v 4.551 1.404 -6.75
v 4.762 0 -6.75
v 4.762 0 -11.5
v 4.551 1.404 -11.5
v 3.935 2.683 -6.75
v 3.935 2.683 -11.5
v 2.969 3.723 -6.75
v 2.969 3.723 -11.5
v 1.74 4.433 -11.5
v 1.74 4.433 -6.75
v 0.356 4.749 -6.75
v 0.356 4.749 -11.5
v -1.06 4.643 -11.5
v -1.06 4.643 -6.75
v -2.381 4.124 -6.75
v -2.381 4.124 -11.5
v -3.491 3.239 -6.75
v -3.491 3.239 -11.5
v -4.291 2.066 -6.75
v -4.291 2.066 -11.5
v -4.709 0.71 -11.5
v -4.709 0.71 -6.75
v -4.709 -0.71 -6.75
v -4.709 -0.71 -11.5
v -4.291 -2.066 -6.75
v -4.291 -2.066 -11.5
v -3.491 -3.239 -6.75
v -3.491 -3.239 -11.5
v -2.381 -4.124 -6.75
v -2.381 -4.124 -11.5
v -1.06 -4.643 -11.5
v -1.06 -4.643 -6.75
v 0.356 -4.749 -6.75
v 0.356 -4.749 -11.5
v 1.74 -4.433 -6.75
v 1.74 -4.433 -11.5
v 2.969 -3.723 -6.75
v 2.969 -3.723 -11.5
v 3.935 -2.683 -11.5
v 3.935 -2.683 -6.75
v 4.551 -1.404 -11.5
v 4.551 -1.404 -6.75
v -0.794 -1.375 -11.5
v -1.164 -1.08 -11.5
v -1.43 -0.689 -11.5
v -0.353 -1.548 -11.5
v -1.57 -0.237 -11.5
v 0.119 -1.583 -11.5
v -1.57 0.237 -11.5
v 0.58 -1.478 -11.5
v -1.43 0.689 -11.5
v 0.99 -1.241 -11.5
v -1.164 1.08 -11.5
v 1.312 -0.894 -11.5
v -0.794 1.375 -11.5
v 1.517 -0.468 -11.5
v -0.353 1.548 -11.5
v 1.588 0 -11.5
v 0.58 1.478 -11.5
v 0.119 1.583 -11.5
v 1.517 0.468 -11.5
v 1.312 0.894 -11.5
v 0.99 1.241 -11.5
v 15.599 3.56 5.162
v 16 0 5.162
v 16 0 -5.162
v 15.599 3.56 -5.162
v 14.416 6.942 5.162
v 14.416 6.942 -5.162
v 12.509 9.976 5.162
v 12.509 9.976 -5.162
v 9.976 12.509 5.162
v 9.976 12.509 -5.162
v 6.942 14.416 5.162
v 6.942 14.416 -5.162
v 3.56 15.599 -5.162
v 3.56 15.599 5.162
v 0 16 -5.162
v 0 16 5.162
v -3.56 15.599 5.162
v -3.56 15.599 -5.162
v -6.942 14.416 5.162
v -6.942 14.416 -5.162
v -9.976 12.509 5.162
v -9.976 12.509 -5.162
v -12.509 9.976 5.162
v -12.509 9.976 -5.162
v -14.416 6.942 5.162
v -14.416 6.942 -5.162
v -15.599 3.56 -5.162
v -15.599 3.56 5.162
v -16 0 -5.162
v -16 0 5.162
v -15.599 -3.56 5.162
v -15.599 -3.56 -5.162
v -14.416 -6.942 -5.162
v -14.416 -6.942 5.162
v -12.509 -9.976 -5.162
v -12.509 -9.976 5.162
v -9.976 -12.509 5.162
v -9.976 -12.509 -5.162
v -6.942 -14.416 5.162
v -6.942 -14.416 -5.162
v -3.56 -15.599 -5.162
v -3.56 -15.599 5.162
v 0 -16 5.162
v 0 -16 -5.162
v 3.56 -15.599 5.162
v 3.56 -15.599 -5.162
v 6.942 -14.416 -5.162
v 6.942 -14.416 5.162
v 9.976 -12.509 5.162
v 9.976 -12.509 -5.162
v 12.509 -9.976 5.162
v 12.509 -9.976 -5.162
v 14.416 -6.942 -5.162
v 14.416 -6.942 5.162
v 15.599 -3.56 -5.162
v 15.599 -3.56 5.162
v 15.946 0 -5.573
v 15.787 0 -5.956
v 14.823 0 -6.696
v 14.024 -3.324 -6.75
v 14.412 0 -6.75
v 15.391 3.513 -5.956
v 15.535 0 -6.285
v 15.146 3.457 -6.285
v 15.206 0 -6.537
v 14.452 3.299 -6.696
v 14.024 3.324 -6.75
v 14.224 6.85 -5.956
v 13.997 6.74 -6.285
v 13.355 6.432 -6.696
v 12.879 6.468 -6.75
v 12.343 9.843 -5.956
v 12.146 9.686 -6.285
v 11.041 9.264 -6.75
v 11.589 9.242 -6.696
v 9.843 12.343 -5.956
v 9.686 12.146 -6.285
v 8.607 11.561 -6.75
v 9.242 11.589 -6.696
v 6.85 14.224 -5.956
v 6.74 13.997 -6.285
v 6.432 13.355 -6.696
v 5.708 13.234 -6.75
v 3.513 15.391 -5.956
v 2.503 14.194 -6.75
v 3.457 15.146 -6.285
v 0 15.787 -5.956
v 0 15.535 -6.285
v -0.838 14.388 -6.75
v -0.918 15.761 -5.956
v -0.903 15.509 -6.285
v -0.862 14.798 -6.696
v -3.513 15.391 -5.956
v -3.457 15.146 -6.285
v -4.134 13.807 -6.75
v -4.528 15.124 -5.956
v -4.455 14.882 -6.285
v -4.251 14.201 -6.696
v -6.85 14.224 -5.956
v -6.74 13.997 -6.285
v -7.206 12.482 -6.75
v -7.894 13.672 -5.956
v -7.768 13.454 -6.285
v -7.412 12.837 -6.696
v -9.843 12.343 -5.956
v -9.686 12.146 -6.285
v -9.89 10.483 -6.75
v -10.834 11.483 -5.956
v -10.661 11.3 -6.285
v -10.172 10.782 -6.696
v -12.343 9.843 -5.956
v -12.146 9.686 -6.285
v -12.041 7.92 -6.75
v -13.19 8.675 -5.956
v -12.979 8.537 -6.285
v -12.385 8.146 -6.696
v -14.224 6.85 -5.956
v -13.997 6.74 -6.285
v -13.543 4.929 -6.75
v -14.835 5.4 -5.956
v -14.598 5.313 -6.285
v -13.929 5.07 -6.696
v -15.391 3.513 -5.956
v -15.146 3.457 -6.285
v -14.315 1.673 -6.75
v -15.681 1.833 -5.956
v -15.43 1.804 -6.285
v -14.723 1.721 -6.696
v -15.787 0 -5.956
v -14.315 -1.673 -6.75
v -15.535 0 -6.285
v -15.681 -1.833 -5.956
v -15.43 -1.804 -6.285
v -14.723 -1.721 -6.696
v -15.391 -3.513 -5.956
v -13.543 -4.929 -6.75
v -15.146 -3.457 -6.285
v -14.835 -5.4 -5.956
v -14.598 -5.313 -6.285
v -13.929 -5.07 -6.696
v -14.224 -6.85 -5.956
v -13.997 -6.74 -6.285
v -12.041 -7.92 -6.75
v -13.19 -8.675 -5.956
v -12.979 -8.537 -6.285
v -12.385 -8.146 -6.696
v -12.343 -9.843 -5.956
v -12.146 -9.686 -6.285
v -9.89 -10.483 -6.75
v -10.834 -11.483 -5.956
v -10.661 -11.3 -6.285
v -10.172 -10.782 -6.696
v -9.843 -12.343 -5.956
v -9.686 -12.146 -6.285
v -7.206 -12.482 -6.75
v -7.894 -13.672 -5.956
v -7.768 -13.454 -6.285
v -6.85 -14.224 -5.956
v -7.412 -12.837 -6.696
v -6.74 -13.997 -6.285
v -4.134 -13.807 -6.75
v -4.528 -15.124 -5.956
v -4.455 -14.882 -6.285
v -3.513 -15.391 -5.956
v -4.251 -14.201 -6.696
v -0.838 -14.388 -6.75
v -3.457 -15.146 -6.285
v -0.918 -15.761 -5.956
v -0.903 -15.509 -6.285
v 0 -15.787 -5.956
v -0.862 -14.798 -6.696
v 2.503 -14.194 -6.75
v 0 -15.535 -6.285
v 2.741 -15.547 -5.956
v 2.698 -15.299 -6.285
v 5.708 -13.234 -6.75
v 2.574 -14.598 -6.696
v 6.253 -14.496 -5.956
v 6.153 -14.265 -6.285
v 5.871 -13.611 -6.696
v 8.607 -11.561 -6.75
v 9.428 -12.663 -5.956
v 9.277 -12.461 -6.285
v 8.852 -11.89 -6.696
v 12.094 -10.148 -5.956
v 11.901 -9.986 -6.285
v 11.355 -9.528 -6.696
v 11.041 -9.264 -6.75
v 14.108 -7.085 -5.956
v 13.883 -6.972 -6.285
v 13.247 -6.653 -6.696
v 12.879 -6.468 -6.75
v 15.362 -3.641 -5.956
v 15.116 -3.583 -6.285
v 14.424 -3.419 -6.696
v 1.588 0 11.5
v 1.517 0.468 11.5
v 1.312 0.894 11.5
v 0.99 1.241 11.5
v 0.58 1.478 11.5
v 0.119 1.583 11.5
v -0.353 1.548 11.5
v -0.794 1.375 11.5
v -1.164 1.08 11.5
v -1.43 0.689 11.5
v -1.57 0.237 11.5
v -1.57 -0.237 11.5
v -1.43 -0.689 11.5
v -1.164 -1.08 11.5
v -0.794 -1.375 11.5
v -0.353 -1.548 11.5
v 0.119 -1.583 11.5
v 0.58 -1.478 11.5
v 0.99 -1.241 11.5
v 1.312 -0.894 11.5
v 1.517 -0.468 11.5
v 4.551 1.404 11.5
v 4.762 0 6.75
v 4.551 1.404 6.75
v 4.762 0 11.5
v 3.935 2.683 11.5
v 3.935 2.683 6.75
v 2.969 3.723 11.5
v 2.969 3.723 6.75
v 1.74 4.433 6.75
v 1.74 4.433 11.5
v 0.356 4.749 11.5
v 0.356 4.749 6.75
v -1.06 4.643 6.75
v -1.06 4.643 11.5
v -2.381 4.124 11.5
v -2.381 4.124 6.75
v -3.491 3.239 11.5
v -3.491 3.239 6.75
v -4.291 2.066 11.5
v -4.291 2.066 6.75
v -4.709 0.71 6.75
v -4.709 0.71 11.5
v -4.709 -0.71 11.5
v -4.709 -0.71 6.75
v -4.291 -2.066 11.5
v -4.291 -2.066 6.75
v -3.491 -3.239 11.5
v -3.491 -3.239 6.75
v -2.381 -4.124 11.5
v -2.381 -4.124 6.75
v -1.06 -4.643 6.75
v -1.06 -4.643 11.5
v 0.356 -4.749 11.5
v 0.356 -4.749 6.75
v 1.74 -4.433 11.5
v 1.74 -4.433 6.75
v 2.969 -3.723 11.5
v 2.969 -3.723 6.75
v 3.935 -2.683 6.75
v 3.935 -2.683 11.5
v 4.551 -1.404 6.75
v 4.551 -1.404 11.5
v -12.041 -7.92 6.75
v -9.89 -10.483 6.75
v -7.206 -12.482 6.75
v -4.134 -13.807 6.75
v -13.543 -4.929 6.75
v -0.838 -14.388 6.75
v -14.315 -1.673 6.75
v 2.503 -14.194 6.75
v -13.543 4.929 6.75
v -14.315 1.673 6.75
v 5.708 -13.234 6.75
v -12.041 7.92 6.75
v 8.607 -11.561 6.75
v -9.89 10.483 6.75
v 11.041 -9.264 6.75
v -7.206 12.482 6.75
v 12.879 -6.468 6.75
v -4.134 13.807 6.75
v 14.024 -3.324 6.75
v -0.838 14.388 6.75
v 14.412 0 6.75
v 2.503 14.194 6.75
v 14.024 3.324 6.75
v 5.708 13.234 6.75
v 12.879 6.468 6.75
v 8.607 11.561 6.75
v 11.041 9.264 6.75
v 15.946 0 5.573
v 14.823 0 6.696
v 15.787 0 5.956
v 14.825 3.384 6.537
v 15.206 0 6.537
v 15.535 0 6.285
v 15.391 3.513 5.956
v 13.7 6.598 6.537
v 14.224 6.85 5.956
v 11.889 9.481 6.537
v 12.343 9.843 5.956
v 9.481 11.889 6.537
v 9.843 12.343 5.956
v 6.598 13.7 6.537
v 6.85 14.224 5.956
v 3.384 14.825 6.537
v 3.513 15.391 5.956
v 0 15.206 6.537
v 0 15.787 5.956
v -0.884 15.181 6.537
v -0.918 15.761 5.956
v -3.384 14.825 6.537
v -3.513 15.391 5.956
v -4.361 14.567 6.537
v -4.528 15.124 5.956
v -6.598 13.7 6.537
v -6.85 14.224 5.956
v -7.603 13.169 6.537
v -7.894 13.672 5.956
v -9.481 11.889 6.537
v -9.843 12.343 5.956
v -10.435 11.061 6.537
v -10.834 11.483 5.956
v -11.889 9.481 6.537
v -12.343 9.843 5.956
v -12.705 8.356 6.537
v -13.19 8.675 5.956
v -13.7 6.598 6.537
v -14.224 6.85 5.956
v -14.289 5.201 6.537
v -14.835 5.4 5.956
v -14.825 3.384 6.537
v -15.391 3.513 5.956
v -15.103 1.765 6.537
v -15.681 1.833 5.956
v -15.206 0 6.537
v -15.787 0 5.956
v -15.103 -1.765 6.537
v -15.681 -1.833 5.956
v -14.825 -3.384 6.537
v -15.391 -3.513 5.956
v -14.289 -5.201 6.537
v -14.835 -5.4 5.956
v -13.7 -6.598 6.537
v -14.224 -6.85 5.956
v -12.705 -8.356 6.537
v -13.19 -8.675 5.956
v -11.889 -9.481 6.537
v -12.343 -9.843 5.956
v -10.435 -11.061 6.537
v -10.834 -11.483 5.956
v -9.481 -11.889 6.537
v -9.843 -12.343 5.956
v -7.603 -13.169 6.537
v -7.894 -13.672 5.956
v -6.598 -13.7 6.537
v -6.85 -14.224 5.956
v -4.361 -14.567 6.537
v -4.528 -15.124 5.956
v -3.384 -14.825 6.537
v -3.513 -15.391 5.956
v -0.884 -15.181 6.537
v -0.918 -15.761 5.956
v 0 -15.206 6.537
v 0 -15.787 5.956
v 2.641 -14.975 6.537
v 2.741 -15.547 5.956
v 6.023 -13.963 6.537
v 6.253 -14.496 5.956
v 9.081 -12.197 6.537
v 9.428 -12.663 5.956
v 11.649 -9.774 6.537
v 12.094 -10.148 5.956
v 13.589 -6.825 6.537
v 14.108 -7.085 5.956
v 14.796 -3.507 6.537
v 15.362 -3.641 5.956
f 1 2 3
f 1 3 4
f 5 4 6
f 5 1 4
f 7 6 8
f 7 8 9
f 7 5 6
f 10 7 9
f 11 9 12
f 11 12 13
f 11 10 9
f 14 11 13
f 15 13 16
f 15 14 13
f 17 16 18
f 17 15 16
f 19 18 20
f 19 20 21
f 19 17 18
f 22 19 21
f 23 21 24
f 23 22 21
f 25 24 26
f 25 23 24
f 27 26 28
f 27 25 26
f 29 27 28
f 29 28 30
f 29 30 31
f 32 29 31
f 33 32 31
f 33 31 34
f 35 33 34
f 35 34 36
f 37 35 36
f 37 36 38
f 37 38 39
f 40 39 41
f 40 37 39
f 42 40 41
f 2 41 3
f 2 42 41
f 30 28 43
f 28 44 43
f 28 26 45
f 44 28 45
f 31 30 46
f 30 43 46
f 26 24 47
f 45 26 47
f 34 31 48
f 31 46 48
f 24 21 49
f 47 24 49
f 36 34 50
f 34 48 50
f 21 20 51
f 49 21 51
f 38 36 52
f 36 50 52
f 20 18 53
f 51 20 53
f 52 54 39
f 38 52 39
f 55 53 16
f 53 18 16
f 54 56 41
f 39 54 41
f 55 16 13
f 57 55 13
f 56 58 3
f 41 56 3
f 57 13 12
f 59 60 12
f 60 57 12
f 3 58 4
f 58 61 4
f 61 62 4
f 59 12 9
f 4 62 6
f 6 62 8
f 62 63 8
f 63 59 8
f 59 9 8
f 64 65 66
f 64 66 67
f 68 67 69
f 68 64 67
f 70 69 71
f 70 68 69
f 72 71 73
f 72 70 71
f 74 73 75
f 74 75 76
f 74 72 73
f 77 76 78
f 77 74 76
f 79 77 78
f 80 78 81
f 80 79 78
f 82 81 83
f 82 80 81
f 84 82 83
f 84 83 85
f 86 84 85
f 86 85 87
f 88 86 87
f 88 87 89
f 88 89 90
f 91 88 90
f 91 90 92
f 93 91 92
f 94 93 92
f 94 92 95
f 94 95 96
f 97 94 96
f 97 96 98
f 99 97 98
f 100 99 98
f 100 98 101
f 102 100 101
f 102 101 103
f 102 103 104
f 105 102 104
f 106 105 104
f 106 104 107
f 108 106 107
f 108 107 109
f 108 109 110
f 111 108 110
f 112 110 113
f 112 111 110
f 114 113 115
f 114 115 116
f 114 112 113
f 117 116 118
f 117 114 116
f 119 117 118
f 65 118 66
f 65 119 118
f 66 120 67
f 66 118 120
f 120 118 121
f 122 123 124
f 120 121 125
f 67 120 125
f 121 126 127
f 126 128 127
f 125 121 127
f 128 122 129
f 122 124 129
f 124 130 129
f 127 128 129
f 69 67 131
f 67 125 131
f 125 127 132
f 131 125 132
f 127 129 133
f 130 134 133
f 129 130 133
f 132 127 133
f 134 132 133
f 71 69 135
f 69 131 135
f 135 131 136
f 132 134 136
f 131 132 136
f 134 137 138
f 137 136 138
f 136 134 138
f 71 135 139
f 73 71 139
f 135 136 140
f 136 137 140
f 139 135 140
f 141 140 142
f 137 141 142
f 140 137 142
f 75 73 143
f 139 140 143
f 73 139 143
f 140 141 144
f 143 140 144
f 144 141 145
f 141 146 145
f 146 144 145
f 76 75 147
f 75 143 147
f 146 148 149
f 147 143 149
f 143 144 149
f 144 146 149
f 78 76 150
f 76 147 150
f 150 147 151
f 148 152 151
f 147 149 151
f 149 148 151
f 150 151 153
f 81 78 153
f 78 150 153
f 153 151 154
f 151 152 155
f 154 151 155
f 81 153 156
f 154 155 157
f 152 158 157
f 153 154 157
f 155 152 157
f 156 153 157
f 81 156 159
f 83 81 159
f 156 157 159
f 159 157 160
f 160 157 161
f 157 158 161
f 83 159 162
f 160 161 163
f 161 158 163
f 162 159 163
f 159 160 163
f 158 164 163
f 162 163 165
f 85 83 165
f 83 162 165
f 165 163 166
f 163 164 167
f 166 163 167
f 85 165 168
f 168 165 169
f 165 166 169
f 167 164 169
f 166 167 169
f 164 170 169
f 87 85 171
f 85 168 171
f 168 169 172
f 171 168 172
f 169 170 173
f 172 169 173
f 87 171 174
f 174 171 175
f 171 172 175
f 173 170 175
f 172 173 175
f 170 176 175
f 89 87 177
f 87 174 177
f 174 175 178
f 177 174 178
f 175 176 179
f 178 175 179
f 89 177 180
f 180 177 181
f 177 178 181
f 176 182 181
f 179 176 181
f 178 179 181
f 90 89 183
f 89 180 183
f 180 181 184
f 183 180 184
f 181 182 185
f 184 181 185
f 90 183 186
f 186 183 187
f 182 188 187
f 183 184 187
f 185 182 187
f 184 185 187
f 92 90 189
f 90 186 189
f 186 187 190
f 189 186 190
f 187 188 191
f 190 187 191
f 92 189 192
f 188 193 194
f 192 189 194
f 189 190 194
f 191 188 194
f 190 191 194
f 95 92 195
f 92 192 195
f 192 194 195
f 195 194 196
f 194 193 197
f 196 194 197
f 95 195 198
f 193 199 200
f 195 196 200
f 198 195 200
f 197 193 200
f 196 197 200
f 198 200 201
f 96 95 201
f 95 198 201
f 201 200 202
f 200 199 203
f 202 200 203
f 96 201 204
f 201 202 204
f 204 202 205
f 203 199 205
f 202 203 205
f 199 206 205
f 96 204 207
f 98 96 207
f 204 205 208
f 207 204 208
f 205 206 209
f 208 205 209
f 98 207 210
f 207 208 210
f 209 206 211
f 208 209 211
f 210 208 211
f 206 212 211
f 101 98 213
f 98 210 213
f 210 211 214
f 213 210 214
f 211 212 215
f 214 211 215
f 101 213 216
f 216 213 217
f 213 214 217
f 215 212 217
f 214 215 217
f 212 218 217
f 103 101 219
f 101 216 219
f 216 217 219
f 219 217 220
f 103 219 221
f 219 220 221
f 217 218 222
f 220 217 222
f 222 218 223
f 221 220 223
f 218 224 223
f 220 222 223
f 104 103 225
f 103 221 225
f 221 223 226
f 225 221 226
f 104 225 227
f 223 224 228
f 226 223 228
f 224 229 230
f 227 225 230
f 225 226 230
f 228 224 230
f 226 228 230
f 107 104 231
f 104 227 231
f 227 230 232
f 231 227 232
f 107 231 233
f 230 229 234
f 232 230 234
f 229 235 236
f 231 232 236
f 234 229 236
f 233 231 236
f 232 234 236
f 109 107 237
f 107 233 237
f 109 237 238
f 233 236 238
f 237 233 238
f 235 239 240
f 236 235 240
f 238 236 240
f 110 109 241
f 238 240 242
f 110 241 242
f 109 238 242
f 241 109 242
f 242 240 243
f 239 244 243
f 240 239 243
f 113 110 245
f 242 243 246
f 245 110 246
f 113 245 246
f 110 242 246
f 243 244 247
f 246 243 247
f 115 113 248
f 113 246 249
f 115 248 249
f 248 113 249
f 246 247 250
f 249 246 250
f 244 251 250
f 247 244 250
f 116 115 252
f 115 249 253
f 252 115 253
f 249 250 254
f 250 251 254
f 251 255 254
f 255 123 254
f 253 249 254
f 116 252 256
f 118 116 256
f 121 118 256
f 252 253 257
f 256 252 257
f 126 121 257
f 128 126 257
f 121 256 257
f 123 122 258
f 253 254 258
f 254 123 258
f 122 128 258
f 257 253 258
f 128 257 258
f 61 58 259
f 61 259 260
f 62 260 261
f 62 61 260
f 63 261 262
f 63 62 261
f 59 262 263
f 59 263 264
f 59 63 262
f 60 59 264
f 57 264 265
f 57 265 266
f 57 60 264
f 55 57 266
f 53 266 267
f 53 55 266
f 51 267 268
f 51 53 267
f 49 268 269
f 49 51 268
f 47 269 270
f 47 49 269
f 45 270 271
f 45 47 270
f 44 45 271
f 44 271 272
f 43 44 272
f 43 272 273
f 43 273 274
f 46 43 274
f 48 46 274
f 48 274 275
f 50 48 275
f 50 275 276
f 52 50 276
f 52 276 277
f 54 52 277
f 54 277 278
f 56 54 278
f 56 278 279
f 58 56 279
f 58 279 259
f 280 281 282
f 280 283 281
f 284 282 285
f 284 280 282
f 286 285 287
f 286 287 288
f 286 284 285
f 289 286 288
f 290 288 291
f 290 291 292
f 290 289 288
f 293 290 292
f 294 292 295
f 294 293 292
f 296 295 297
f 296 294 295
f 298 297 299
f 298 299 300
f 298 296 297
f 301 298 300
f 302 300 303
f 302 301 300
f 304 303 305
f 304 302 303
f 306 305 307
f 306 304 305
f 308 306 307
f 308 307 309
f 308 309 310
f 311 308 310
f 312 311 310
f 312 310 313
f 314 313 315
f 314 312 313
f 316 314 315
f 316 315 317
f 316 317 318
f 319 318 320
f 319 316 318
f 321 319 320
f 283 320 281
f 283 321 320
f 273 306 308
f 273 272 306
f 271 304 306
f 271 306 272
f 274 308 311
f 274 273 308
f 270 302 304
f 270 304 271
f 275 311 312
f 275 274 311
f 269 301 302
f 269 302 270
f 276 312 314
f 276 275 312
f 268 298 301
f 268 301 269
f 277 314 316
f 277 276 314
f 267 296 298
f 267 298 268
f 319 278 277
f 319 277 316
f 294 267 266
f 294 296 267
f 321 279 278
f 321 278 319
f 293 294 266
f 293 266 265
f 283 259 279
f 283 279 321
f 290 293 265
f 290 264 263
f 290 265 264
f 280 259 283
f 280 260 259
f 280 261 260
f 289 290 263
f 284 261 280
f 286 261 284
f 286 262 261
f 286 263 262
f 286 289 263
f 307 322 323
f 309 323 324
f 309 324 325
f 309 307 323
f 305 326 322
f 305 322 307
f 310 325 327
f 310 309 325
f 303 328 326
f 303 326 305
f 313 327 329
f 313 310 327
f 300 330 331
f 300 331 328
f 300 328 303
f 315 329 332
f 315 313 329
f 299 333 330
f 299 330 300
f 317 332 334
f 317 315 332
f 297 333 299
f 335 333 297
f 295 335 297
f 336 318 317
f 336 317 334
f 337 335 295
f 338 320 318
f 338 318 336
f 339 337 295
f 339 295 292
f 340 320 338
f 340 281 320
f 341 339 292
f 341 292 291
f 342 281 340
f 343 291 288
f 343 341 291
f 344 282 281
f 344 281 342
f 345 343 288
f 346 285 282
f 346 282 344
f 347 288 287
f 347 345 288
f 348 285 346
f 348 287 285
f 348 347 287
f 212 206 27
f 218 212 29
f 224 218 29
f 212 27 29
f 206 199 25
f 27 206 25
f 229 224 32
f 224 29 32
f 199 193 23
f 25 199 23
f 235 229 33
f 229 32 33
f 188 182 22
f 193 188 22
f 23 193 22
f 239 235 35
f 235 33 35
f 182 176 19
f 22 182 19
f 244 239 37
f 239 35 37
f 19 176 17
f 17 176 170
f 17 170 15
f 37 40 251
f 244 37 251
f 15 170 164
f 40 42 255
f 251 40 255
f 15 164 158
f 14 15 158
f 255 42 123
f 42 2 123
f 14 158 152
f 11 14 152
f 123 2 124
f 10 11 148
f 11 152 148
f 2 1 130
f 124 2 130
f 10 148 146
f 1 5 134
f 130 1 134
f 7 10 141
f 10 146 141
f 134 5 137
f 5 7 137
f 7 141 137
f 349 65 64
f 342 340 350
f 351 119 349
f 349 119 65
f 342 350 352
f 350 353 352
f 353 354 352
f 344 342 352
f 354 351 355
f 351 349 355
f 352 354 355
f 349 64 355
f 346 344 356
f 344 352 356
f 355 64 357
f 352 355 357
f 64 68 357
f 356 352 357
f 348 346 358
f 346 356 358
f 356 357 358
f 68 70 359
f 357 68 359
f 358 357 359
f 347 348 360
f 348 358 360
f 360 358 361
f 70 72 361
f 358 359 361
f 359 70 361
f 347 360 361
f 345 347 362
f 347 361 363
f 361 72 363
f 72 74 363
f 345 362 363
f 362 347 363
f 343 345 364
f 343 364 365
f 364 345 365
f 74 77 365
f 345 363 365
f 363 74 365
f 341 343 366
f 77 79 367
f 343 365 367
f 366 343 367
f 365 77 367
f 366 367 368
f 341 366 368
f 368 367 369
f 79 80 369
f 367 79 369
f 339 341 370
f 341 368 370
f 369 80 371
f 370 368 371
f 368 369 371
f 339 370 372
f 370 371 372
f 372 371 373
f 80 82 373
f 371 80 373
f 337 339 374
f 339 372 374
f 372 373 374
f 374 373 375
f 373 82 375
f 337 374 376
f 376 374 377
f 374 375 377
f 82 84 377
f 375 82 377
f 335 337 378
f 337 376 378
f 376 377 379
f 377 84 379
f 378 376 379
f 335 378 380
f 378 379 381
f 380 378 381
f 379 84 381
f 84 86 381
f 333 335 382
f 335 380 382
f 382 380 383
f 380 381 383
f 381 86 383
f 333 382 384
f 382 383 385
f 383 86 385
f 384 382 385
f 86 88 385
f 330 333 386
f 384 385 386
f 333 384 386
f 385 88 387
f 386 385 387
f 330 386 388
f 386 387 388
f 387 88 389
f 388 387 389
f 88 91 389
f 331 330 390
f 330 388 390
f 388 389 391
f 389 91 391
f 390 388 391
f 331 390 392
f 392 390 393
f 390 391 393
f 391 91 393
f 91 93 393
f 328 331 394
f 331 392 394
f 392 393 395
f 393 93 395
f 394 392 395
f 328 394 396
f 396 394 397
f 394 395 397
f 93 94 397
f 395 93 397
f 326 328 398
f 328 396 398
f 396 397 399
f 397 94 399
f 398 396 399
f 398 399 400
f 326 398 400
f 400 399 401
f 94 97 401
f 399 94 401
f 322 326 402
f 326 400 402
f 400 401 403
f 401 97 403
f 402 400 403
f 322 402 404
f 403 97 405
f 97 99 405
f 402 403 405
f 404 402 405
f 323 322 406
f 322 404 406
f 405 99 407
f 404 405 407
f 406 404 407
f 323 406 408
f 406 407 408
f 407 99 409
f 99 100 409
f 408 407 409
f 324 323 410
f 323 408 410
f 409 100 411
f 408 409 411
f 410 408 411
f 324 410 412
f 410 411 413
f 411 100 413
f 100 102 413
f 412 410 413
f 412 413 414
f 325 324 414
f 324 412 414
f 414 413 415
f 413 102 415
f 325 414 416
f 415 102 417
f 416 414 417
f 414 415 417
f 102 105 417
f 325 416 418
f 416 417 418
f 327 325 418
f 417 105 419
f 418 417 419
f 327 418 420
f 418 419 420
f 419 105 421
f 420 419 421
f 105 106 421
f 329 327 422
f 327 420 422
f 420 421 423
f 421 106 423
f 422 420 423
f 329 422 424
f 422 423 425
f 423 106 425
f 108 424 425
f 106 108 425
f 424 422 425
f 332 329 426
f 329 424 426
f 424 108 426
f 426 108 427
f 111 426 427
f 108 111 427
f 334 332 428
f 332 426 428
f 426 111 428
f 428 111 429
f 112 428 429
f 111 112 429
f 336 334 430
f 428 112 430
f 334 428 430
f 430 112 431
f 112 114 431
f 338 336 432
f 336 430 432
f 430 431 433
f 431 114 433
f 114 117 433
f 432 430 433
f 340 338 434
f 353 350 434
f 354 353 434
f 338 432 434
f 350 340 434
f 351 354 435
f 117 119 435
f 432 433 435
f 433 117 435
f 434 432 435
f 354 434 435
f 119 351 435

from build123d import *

# Parameters (mm, degrees)
F0_R     = 16
F0_R_2   = 1.5875
F1_DEPTH = 6.75
F2_R     = 4.7625
F2_R_2   = 1.5875
F3_DEPTH = 11.500002
F4_R     = 1.5875


with BuildPart() as f1:
    # F0 (on Top) → F1 (new body, symmetric)
    with BuildSketch(Plane.XY):
        Circle(F0_R)
        Circle(F0_R_2, mode=Mode.SUBTRACT)
    extrude(amount=F1_DEPTH, both=True)

    # F2 (on Top) → F3 (join, symmetric)
    with BuildSketch(Plane.XY):
        Circle(F2_R)
        Circle(F2_R_2, mode=Mode.SUBTRACT)
    extrude(amount=F3_DEPTH, both=True)

    # F4
    f4_edges = [f1.edges().sort_by_distance(p)[0] for p in [
        (-16, 0, 6.75),
        (-16, 0, -6.75),
    ]]
    fillet(f4_edges, radius=F4_R)


solid = f1.part
